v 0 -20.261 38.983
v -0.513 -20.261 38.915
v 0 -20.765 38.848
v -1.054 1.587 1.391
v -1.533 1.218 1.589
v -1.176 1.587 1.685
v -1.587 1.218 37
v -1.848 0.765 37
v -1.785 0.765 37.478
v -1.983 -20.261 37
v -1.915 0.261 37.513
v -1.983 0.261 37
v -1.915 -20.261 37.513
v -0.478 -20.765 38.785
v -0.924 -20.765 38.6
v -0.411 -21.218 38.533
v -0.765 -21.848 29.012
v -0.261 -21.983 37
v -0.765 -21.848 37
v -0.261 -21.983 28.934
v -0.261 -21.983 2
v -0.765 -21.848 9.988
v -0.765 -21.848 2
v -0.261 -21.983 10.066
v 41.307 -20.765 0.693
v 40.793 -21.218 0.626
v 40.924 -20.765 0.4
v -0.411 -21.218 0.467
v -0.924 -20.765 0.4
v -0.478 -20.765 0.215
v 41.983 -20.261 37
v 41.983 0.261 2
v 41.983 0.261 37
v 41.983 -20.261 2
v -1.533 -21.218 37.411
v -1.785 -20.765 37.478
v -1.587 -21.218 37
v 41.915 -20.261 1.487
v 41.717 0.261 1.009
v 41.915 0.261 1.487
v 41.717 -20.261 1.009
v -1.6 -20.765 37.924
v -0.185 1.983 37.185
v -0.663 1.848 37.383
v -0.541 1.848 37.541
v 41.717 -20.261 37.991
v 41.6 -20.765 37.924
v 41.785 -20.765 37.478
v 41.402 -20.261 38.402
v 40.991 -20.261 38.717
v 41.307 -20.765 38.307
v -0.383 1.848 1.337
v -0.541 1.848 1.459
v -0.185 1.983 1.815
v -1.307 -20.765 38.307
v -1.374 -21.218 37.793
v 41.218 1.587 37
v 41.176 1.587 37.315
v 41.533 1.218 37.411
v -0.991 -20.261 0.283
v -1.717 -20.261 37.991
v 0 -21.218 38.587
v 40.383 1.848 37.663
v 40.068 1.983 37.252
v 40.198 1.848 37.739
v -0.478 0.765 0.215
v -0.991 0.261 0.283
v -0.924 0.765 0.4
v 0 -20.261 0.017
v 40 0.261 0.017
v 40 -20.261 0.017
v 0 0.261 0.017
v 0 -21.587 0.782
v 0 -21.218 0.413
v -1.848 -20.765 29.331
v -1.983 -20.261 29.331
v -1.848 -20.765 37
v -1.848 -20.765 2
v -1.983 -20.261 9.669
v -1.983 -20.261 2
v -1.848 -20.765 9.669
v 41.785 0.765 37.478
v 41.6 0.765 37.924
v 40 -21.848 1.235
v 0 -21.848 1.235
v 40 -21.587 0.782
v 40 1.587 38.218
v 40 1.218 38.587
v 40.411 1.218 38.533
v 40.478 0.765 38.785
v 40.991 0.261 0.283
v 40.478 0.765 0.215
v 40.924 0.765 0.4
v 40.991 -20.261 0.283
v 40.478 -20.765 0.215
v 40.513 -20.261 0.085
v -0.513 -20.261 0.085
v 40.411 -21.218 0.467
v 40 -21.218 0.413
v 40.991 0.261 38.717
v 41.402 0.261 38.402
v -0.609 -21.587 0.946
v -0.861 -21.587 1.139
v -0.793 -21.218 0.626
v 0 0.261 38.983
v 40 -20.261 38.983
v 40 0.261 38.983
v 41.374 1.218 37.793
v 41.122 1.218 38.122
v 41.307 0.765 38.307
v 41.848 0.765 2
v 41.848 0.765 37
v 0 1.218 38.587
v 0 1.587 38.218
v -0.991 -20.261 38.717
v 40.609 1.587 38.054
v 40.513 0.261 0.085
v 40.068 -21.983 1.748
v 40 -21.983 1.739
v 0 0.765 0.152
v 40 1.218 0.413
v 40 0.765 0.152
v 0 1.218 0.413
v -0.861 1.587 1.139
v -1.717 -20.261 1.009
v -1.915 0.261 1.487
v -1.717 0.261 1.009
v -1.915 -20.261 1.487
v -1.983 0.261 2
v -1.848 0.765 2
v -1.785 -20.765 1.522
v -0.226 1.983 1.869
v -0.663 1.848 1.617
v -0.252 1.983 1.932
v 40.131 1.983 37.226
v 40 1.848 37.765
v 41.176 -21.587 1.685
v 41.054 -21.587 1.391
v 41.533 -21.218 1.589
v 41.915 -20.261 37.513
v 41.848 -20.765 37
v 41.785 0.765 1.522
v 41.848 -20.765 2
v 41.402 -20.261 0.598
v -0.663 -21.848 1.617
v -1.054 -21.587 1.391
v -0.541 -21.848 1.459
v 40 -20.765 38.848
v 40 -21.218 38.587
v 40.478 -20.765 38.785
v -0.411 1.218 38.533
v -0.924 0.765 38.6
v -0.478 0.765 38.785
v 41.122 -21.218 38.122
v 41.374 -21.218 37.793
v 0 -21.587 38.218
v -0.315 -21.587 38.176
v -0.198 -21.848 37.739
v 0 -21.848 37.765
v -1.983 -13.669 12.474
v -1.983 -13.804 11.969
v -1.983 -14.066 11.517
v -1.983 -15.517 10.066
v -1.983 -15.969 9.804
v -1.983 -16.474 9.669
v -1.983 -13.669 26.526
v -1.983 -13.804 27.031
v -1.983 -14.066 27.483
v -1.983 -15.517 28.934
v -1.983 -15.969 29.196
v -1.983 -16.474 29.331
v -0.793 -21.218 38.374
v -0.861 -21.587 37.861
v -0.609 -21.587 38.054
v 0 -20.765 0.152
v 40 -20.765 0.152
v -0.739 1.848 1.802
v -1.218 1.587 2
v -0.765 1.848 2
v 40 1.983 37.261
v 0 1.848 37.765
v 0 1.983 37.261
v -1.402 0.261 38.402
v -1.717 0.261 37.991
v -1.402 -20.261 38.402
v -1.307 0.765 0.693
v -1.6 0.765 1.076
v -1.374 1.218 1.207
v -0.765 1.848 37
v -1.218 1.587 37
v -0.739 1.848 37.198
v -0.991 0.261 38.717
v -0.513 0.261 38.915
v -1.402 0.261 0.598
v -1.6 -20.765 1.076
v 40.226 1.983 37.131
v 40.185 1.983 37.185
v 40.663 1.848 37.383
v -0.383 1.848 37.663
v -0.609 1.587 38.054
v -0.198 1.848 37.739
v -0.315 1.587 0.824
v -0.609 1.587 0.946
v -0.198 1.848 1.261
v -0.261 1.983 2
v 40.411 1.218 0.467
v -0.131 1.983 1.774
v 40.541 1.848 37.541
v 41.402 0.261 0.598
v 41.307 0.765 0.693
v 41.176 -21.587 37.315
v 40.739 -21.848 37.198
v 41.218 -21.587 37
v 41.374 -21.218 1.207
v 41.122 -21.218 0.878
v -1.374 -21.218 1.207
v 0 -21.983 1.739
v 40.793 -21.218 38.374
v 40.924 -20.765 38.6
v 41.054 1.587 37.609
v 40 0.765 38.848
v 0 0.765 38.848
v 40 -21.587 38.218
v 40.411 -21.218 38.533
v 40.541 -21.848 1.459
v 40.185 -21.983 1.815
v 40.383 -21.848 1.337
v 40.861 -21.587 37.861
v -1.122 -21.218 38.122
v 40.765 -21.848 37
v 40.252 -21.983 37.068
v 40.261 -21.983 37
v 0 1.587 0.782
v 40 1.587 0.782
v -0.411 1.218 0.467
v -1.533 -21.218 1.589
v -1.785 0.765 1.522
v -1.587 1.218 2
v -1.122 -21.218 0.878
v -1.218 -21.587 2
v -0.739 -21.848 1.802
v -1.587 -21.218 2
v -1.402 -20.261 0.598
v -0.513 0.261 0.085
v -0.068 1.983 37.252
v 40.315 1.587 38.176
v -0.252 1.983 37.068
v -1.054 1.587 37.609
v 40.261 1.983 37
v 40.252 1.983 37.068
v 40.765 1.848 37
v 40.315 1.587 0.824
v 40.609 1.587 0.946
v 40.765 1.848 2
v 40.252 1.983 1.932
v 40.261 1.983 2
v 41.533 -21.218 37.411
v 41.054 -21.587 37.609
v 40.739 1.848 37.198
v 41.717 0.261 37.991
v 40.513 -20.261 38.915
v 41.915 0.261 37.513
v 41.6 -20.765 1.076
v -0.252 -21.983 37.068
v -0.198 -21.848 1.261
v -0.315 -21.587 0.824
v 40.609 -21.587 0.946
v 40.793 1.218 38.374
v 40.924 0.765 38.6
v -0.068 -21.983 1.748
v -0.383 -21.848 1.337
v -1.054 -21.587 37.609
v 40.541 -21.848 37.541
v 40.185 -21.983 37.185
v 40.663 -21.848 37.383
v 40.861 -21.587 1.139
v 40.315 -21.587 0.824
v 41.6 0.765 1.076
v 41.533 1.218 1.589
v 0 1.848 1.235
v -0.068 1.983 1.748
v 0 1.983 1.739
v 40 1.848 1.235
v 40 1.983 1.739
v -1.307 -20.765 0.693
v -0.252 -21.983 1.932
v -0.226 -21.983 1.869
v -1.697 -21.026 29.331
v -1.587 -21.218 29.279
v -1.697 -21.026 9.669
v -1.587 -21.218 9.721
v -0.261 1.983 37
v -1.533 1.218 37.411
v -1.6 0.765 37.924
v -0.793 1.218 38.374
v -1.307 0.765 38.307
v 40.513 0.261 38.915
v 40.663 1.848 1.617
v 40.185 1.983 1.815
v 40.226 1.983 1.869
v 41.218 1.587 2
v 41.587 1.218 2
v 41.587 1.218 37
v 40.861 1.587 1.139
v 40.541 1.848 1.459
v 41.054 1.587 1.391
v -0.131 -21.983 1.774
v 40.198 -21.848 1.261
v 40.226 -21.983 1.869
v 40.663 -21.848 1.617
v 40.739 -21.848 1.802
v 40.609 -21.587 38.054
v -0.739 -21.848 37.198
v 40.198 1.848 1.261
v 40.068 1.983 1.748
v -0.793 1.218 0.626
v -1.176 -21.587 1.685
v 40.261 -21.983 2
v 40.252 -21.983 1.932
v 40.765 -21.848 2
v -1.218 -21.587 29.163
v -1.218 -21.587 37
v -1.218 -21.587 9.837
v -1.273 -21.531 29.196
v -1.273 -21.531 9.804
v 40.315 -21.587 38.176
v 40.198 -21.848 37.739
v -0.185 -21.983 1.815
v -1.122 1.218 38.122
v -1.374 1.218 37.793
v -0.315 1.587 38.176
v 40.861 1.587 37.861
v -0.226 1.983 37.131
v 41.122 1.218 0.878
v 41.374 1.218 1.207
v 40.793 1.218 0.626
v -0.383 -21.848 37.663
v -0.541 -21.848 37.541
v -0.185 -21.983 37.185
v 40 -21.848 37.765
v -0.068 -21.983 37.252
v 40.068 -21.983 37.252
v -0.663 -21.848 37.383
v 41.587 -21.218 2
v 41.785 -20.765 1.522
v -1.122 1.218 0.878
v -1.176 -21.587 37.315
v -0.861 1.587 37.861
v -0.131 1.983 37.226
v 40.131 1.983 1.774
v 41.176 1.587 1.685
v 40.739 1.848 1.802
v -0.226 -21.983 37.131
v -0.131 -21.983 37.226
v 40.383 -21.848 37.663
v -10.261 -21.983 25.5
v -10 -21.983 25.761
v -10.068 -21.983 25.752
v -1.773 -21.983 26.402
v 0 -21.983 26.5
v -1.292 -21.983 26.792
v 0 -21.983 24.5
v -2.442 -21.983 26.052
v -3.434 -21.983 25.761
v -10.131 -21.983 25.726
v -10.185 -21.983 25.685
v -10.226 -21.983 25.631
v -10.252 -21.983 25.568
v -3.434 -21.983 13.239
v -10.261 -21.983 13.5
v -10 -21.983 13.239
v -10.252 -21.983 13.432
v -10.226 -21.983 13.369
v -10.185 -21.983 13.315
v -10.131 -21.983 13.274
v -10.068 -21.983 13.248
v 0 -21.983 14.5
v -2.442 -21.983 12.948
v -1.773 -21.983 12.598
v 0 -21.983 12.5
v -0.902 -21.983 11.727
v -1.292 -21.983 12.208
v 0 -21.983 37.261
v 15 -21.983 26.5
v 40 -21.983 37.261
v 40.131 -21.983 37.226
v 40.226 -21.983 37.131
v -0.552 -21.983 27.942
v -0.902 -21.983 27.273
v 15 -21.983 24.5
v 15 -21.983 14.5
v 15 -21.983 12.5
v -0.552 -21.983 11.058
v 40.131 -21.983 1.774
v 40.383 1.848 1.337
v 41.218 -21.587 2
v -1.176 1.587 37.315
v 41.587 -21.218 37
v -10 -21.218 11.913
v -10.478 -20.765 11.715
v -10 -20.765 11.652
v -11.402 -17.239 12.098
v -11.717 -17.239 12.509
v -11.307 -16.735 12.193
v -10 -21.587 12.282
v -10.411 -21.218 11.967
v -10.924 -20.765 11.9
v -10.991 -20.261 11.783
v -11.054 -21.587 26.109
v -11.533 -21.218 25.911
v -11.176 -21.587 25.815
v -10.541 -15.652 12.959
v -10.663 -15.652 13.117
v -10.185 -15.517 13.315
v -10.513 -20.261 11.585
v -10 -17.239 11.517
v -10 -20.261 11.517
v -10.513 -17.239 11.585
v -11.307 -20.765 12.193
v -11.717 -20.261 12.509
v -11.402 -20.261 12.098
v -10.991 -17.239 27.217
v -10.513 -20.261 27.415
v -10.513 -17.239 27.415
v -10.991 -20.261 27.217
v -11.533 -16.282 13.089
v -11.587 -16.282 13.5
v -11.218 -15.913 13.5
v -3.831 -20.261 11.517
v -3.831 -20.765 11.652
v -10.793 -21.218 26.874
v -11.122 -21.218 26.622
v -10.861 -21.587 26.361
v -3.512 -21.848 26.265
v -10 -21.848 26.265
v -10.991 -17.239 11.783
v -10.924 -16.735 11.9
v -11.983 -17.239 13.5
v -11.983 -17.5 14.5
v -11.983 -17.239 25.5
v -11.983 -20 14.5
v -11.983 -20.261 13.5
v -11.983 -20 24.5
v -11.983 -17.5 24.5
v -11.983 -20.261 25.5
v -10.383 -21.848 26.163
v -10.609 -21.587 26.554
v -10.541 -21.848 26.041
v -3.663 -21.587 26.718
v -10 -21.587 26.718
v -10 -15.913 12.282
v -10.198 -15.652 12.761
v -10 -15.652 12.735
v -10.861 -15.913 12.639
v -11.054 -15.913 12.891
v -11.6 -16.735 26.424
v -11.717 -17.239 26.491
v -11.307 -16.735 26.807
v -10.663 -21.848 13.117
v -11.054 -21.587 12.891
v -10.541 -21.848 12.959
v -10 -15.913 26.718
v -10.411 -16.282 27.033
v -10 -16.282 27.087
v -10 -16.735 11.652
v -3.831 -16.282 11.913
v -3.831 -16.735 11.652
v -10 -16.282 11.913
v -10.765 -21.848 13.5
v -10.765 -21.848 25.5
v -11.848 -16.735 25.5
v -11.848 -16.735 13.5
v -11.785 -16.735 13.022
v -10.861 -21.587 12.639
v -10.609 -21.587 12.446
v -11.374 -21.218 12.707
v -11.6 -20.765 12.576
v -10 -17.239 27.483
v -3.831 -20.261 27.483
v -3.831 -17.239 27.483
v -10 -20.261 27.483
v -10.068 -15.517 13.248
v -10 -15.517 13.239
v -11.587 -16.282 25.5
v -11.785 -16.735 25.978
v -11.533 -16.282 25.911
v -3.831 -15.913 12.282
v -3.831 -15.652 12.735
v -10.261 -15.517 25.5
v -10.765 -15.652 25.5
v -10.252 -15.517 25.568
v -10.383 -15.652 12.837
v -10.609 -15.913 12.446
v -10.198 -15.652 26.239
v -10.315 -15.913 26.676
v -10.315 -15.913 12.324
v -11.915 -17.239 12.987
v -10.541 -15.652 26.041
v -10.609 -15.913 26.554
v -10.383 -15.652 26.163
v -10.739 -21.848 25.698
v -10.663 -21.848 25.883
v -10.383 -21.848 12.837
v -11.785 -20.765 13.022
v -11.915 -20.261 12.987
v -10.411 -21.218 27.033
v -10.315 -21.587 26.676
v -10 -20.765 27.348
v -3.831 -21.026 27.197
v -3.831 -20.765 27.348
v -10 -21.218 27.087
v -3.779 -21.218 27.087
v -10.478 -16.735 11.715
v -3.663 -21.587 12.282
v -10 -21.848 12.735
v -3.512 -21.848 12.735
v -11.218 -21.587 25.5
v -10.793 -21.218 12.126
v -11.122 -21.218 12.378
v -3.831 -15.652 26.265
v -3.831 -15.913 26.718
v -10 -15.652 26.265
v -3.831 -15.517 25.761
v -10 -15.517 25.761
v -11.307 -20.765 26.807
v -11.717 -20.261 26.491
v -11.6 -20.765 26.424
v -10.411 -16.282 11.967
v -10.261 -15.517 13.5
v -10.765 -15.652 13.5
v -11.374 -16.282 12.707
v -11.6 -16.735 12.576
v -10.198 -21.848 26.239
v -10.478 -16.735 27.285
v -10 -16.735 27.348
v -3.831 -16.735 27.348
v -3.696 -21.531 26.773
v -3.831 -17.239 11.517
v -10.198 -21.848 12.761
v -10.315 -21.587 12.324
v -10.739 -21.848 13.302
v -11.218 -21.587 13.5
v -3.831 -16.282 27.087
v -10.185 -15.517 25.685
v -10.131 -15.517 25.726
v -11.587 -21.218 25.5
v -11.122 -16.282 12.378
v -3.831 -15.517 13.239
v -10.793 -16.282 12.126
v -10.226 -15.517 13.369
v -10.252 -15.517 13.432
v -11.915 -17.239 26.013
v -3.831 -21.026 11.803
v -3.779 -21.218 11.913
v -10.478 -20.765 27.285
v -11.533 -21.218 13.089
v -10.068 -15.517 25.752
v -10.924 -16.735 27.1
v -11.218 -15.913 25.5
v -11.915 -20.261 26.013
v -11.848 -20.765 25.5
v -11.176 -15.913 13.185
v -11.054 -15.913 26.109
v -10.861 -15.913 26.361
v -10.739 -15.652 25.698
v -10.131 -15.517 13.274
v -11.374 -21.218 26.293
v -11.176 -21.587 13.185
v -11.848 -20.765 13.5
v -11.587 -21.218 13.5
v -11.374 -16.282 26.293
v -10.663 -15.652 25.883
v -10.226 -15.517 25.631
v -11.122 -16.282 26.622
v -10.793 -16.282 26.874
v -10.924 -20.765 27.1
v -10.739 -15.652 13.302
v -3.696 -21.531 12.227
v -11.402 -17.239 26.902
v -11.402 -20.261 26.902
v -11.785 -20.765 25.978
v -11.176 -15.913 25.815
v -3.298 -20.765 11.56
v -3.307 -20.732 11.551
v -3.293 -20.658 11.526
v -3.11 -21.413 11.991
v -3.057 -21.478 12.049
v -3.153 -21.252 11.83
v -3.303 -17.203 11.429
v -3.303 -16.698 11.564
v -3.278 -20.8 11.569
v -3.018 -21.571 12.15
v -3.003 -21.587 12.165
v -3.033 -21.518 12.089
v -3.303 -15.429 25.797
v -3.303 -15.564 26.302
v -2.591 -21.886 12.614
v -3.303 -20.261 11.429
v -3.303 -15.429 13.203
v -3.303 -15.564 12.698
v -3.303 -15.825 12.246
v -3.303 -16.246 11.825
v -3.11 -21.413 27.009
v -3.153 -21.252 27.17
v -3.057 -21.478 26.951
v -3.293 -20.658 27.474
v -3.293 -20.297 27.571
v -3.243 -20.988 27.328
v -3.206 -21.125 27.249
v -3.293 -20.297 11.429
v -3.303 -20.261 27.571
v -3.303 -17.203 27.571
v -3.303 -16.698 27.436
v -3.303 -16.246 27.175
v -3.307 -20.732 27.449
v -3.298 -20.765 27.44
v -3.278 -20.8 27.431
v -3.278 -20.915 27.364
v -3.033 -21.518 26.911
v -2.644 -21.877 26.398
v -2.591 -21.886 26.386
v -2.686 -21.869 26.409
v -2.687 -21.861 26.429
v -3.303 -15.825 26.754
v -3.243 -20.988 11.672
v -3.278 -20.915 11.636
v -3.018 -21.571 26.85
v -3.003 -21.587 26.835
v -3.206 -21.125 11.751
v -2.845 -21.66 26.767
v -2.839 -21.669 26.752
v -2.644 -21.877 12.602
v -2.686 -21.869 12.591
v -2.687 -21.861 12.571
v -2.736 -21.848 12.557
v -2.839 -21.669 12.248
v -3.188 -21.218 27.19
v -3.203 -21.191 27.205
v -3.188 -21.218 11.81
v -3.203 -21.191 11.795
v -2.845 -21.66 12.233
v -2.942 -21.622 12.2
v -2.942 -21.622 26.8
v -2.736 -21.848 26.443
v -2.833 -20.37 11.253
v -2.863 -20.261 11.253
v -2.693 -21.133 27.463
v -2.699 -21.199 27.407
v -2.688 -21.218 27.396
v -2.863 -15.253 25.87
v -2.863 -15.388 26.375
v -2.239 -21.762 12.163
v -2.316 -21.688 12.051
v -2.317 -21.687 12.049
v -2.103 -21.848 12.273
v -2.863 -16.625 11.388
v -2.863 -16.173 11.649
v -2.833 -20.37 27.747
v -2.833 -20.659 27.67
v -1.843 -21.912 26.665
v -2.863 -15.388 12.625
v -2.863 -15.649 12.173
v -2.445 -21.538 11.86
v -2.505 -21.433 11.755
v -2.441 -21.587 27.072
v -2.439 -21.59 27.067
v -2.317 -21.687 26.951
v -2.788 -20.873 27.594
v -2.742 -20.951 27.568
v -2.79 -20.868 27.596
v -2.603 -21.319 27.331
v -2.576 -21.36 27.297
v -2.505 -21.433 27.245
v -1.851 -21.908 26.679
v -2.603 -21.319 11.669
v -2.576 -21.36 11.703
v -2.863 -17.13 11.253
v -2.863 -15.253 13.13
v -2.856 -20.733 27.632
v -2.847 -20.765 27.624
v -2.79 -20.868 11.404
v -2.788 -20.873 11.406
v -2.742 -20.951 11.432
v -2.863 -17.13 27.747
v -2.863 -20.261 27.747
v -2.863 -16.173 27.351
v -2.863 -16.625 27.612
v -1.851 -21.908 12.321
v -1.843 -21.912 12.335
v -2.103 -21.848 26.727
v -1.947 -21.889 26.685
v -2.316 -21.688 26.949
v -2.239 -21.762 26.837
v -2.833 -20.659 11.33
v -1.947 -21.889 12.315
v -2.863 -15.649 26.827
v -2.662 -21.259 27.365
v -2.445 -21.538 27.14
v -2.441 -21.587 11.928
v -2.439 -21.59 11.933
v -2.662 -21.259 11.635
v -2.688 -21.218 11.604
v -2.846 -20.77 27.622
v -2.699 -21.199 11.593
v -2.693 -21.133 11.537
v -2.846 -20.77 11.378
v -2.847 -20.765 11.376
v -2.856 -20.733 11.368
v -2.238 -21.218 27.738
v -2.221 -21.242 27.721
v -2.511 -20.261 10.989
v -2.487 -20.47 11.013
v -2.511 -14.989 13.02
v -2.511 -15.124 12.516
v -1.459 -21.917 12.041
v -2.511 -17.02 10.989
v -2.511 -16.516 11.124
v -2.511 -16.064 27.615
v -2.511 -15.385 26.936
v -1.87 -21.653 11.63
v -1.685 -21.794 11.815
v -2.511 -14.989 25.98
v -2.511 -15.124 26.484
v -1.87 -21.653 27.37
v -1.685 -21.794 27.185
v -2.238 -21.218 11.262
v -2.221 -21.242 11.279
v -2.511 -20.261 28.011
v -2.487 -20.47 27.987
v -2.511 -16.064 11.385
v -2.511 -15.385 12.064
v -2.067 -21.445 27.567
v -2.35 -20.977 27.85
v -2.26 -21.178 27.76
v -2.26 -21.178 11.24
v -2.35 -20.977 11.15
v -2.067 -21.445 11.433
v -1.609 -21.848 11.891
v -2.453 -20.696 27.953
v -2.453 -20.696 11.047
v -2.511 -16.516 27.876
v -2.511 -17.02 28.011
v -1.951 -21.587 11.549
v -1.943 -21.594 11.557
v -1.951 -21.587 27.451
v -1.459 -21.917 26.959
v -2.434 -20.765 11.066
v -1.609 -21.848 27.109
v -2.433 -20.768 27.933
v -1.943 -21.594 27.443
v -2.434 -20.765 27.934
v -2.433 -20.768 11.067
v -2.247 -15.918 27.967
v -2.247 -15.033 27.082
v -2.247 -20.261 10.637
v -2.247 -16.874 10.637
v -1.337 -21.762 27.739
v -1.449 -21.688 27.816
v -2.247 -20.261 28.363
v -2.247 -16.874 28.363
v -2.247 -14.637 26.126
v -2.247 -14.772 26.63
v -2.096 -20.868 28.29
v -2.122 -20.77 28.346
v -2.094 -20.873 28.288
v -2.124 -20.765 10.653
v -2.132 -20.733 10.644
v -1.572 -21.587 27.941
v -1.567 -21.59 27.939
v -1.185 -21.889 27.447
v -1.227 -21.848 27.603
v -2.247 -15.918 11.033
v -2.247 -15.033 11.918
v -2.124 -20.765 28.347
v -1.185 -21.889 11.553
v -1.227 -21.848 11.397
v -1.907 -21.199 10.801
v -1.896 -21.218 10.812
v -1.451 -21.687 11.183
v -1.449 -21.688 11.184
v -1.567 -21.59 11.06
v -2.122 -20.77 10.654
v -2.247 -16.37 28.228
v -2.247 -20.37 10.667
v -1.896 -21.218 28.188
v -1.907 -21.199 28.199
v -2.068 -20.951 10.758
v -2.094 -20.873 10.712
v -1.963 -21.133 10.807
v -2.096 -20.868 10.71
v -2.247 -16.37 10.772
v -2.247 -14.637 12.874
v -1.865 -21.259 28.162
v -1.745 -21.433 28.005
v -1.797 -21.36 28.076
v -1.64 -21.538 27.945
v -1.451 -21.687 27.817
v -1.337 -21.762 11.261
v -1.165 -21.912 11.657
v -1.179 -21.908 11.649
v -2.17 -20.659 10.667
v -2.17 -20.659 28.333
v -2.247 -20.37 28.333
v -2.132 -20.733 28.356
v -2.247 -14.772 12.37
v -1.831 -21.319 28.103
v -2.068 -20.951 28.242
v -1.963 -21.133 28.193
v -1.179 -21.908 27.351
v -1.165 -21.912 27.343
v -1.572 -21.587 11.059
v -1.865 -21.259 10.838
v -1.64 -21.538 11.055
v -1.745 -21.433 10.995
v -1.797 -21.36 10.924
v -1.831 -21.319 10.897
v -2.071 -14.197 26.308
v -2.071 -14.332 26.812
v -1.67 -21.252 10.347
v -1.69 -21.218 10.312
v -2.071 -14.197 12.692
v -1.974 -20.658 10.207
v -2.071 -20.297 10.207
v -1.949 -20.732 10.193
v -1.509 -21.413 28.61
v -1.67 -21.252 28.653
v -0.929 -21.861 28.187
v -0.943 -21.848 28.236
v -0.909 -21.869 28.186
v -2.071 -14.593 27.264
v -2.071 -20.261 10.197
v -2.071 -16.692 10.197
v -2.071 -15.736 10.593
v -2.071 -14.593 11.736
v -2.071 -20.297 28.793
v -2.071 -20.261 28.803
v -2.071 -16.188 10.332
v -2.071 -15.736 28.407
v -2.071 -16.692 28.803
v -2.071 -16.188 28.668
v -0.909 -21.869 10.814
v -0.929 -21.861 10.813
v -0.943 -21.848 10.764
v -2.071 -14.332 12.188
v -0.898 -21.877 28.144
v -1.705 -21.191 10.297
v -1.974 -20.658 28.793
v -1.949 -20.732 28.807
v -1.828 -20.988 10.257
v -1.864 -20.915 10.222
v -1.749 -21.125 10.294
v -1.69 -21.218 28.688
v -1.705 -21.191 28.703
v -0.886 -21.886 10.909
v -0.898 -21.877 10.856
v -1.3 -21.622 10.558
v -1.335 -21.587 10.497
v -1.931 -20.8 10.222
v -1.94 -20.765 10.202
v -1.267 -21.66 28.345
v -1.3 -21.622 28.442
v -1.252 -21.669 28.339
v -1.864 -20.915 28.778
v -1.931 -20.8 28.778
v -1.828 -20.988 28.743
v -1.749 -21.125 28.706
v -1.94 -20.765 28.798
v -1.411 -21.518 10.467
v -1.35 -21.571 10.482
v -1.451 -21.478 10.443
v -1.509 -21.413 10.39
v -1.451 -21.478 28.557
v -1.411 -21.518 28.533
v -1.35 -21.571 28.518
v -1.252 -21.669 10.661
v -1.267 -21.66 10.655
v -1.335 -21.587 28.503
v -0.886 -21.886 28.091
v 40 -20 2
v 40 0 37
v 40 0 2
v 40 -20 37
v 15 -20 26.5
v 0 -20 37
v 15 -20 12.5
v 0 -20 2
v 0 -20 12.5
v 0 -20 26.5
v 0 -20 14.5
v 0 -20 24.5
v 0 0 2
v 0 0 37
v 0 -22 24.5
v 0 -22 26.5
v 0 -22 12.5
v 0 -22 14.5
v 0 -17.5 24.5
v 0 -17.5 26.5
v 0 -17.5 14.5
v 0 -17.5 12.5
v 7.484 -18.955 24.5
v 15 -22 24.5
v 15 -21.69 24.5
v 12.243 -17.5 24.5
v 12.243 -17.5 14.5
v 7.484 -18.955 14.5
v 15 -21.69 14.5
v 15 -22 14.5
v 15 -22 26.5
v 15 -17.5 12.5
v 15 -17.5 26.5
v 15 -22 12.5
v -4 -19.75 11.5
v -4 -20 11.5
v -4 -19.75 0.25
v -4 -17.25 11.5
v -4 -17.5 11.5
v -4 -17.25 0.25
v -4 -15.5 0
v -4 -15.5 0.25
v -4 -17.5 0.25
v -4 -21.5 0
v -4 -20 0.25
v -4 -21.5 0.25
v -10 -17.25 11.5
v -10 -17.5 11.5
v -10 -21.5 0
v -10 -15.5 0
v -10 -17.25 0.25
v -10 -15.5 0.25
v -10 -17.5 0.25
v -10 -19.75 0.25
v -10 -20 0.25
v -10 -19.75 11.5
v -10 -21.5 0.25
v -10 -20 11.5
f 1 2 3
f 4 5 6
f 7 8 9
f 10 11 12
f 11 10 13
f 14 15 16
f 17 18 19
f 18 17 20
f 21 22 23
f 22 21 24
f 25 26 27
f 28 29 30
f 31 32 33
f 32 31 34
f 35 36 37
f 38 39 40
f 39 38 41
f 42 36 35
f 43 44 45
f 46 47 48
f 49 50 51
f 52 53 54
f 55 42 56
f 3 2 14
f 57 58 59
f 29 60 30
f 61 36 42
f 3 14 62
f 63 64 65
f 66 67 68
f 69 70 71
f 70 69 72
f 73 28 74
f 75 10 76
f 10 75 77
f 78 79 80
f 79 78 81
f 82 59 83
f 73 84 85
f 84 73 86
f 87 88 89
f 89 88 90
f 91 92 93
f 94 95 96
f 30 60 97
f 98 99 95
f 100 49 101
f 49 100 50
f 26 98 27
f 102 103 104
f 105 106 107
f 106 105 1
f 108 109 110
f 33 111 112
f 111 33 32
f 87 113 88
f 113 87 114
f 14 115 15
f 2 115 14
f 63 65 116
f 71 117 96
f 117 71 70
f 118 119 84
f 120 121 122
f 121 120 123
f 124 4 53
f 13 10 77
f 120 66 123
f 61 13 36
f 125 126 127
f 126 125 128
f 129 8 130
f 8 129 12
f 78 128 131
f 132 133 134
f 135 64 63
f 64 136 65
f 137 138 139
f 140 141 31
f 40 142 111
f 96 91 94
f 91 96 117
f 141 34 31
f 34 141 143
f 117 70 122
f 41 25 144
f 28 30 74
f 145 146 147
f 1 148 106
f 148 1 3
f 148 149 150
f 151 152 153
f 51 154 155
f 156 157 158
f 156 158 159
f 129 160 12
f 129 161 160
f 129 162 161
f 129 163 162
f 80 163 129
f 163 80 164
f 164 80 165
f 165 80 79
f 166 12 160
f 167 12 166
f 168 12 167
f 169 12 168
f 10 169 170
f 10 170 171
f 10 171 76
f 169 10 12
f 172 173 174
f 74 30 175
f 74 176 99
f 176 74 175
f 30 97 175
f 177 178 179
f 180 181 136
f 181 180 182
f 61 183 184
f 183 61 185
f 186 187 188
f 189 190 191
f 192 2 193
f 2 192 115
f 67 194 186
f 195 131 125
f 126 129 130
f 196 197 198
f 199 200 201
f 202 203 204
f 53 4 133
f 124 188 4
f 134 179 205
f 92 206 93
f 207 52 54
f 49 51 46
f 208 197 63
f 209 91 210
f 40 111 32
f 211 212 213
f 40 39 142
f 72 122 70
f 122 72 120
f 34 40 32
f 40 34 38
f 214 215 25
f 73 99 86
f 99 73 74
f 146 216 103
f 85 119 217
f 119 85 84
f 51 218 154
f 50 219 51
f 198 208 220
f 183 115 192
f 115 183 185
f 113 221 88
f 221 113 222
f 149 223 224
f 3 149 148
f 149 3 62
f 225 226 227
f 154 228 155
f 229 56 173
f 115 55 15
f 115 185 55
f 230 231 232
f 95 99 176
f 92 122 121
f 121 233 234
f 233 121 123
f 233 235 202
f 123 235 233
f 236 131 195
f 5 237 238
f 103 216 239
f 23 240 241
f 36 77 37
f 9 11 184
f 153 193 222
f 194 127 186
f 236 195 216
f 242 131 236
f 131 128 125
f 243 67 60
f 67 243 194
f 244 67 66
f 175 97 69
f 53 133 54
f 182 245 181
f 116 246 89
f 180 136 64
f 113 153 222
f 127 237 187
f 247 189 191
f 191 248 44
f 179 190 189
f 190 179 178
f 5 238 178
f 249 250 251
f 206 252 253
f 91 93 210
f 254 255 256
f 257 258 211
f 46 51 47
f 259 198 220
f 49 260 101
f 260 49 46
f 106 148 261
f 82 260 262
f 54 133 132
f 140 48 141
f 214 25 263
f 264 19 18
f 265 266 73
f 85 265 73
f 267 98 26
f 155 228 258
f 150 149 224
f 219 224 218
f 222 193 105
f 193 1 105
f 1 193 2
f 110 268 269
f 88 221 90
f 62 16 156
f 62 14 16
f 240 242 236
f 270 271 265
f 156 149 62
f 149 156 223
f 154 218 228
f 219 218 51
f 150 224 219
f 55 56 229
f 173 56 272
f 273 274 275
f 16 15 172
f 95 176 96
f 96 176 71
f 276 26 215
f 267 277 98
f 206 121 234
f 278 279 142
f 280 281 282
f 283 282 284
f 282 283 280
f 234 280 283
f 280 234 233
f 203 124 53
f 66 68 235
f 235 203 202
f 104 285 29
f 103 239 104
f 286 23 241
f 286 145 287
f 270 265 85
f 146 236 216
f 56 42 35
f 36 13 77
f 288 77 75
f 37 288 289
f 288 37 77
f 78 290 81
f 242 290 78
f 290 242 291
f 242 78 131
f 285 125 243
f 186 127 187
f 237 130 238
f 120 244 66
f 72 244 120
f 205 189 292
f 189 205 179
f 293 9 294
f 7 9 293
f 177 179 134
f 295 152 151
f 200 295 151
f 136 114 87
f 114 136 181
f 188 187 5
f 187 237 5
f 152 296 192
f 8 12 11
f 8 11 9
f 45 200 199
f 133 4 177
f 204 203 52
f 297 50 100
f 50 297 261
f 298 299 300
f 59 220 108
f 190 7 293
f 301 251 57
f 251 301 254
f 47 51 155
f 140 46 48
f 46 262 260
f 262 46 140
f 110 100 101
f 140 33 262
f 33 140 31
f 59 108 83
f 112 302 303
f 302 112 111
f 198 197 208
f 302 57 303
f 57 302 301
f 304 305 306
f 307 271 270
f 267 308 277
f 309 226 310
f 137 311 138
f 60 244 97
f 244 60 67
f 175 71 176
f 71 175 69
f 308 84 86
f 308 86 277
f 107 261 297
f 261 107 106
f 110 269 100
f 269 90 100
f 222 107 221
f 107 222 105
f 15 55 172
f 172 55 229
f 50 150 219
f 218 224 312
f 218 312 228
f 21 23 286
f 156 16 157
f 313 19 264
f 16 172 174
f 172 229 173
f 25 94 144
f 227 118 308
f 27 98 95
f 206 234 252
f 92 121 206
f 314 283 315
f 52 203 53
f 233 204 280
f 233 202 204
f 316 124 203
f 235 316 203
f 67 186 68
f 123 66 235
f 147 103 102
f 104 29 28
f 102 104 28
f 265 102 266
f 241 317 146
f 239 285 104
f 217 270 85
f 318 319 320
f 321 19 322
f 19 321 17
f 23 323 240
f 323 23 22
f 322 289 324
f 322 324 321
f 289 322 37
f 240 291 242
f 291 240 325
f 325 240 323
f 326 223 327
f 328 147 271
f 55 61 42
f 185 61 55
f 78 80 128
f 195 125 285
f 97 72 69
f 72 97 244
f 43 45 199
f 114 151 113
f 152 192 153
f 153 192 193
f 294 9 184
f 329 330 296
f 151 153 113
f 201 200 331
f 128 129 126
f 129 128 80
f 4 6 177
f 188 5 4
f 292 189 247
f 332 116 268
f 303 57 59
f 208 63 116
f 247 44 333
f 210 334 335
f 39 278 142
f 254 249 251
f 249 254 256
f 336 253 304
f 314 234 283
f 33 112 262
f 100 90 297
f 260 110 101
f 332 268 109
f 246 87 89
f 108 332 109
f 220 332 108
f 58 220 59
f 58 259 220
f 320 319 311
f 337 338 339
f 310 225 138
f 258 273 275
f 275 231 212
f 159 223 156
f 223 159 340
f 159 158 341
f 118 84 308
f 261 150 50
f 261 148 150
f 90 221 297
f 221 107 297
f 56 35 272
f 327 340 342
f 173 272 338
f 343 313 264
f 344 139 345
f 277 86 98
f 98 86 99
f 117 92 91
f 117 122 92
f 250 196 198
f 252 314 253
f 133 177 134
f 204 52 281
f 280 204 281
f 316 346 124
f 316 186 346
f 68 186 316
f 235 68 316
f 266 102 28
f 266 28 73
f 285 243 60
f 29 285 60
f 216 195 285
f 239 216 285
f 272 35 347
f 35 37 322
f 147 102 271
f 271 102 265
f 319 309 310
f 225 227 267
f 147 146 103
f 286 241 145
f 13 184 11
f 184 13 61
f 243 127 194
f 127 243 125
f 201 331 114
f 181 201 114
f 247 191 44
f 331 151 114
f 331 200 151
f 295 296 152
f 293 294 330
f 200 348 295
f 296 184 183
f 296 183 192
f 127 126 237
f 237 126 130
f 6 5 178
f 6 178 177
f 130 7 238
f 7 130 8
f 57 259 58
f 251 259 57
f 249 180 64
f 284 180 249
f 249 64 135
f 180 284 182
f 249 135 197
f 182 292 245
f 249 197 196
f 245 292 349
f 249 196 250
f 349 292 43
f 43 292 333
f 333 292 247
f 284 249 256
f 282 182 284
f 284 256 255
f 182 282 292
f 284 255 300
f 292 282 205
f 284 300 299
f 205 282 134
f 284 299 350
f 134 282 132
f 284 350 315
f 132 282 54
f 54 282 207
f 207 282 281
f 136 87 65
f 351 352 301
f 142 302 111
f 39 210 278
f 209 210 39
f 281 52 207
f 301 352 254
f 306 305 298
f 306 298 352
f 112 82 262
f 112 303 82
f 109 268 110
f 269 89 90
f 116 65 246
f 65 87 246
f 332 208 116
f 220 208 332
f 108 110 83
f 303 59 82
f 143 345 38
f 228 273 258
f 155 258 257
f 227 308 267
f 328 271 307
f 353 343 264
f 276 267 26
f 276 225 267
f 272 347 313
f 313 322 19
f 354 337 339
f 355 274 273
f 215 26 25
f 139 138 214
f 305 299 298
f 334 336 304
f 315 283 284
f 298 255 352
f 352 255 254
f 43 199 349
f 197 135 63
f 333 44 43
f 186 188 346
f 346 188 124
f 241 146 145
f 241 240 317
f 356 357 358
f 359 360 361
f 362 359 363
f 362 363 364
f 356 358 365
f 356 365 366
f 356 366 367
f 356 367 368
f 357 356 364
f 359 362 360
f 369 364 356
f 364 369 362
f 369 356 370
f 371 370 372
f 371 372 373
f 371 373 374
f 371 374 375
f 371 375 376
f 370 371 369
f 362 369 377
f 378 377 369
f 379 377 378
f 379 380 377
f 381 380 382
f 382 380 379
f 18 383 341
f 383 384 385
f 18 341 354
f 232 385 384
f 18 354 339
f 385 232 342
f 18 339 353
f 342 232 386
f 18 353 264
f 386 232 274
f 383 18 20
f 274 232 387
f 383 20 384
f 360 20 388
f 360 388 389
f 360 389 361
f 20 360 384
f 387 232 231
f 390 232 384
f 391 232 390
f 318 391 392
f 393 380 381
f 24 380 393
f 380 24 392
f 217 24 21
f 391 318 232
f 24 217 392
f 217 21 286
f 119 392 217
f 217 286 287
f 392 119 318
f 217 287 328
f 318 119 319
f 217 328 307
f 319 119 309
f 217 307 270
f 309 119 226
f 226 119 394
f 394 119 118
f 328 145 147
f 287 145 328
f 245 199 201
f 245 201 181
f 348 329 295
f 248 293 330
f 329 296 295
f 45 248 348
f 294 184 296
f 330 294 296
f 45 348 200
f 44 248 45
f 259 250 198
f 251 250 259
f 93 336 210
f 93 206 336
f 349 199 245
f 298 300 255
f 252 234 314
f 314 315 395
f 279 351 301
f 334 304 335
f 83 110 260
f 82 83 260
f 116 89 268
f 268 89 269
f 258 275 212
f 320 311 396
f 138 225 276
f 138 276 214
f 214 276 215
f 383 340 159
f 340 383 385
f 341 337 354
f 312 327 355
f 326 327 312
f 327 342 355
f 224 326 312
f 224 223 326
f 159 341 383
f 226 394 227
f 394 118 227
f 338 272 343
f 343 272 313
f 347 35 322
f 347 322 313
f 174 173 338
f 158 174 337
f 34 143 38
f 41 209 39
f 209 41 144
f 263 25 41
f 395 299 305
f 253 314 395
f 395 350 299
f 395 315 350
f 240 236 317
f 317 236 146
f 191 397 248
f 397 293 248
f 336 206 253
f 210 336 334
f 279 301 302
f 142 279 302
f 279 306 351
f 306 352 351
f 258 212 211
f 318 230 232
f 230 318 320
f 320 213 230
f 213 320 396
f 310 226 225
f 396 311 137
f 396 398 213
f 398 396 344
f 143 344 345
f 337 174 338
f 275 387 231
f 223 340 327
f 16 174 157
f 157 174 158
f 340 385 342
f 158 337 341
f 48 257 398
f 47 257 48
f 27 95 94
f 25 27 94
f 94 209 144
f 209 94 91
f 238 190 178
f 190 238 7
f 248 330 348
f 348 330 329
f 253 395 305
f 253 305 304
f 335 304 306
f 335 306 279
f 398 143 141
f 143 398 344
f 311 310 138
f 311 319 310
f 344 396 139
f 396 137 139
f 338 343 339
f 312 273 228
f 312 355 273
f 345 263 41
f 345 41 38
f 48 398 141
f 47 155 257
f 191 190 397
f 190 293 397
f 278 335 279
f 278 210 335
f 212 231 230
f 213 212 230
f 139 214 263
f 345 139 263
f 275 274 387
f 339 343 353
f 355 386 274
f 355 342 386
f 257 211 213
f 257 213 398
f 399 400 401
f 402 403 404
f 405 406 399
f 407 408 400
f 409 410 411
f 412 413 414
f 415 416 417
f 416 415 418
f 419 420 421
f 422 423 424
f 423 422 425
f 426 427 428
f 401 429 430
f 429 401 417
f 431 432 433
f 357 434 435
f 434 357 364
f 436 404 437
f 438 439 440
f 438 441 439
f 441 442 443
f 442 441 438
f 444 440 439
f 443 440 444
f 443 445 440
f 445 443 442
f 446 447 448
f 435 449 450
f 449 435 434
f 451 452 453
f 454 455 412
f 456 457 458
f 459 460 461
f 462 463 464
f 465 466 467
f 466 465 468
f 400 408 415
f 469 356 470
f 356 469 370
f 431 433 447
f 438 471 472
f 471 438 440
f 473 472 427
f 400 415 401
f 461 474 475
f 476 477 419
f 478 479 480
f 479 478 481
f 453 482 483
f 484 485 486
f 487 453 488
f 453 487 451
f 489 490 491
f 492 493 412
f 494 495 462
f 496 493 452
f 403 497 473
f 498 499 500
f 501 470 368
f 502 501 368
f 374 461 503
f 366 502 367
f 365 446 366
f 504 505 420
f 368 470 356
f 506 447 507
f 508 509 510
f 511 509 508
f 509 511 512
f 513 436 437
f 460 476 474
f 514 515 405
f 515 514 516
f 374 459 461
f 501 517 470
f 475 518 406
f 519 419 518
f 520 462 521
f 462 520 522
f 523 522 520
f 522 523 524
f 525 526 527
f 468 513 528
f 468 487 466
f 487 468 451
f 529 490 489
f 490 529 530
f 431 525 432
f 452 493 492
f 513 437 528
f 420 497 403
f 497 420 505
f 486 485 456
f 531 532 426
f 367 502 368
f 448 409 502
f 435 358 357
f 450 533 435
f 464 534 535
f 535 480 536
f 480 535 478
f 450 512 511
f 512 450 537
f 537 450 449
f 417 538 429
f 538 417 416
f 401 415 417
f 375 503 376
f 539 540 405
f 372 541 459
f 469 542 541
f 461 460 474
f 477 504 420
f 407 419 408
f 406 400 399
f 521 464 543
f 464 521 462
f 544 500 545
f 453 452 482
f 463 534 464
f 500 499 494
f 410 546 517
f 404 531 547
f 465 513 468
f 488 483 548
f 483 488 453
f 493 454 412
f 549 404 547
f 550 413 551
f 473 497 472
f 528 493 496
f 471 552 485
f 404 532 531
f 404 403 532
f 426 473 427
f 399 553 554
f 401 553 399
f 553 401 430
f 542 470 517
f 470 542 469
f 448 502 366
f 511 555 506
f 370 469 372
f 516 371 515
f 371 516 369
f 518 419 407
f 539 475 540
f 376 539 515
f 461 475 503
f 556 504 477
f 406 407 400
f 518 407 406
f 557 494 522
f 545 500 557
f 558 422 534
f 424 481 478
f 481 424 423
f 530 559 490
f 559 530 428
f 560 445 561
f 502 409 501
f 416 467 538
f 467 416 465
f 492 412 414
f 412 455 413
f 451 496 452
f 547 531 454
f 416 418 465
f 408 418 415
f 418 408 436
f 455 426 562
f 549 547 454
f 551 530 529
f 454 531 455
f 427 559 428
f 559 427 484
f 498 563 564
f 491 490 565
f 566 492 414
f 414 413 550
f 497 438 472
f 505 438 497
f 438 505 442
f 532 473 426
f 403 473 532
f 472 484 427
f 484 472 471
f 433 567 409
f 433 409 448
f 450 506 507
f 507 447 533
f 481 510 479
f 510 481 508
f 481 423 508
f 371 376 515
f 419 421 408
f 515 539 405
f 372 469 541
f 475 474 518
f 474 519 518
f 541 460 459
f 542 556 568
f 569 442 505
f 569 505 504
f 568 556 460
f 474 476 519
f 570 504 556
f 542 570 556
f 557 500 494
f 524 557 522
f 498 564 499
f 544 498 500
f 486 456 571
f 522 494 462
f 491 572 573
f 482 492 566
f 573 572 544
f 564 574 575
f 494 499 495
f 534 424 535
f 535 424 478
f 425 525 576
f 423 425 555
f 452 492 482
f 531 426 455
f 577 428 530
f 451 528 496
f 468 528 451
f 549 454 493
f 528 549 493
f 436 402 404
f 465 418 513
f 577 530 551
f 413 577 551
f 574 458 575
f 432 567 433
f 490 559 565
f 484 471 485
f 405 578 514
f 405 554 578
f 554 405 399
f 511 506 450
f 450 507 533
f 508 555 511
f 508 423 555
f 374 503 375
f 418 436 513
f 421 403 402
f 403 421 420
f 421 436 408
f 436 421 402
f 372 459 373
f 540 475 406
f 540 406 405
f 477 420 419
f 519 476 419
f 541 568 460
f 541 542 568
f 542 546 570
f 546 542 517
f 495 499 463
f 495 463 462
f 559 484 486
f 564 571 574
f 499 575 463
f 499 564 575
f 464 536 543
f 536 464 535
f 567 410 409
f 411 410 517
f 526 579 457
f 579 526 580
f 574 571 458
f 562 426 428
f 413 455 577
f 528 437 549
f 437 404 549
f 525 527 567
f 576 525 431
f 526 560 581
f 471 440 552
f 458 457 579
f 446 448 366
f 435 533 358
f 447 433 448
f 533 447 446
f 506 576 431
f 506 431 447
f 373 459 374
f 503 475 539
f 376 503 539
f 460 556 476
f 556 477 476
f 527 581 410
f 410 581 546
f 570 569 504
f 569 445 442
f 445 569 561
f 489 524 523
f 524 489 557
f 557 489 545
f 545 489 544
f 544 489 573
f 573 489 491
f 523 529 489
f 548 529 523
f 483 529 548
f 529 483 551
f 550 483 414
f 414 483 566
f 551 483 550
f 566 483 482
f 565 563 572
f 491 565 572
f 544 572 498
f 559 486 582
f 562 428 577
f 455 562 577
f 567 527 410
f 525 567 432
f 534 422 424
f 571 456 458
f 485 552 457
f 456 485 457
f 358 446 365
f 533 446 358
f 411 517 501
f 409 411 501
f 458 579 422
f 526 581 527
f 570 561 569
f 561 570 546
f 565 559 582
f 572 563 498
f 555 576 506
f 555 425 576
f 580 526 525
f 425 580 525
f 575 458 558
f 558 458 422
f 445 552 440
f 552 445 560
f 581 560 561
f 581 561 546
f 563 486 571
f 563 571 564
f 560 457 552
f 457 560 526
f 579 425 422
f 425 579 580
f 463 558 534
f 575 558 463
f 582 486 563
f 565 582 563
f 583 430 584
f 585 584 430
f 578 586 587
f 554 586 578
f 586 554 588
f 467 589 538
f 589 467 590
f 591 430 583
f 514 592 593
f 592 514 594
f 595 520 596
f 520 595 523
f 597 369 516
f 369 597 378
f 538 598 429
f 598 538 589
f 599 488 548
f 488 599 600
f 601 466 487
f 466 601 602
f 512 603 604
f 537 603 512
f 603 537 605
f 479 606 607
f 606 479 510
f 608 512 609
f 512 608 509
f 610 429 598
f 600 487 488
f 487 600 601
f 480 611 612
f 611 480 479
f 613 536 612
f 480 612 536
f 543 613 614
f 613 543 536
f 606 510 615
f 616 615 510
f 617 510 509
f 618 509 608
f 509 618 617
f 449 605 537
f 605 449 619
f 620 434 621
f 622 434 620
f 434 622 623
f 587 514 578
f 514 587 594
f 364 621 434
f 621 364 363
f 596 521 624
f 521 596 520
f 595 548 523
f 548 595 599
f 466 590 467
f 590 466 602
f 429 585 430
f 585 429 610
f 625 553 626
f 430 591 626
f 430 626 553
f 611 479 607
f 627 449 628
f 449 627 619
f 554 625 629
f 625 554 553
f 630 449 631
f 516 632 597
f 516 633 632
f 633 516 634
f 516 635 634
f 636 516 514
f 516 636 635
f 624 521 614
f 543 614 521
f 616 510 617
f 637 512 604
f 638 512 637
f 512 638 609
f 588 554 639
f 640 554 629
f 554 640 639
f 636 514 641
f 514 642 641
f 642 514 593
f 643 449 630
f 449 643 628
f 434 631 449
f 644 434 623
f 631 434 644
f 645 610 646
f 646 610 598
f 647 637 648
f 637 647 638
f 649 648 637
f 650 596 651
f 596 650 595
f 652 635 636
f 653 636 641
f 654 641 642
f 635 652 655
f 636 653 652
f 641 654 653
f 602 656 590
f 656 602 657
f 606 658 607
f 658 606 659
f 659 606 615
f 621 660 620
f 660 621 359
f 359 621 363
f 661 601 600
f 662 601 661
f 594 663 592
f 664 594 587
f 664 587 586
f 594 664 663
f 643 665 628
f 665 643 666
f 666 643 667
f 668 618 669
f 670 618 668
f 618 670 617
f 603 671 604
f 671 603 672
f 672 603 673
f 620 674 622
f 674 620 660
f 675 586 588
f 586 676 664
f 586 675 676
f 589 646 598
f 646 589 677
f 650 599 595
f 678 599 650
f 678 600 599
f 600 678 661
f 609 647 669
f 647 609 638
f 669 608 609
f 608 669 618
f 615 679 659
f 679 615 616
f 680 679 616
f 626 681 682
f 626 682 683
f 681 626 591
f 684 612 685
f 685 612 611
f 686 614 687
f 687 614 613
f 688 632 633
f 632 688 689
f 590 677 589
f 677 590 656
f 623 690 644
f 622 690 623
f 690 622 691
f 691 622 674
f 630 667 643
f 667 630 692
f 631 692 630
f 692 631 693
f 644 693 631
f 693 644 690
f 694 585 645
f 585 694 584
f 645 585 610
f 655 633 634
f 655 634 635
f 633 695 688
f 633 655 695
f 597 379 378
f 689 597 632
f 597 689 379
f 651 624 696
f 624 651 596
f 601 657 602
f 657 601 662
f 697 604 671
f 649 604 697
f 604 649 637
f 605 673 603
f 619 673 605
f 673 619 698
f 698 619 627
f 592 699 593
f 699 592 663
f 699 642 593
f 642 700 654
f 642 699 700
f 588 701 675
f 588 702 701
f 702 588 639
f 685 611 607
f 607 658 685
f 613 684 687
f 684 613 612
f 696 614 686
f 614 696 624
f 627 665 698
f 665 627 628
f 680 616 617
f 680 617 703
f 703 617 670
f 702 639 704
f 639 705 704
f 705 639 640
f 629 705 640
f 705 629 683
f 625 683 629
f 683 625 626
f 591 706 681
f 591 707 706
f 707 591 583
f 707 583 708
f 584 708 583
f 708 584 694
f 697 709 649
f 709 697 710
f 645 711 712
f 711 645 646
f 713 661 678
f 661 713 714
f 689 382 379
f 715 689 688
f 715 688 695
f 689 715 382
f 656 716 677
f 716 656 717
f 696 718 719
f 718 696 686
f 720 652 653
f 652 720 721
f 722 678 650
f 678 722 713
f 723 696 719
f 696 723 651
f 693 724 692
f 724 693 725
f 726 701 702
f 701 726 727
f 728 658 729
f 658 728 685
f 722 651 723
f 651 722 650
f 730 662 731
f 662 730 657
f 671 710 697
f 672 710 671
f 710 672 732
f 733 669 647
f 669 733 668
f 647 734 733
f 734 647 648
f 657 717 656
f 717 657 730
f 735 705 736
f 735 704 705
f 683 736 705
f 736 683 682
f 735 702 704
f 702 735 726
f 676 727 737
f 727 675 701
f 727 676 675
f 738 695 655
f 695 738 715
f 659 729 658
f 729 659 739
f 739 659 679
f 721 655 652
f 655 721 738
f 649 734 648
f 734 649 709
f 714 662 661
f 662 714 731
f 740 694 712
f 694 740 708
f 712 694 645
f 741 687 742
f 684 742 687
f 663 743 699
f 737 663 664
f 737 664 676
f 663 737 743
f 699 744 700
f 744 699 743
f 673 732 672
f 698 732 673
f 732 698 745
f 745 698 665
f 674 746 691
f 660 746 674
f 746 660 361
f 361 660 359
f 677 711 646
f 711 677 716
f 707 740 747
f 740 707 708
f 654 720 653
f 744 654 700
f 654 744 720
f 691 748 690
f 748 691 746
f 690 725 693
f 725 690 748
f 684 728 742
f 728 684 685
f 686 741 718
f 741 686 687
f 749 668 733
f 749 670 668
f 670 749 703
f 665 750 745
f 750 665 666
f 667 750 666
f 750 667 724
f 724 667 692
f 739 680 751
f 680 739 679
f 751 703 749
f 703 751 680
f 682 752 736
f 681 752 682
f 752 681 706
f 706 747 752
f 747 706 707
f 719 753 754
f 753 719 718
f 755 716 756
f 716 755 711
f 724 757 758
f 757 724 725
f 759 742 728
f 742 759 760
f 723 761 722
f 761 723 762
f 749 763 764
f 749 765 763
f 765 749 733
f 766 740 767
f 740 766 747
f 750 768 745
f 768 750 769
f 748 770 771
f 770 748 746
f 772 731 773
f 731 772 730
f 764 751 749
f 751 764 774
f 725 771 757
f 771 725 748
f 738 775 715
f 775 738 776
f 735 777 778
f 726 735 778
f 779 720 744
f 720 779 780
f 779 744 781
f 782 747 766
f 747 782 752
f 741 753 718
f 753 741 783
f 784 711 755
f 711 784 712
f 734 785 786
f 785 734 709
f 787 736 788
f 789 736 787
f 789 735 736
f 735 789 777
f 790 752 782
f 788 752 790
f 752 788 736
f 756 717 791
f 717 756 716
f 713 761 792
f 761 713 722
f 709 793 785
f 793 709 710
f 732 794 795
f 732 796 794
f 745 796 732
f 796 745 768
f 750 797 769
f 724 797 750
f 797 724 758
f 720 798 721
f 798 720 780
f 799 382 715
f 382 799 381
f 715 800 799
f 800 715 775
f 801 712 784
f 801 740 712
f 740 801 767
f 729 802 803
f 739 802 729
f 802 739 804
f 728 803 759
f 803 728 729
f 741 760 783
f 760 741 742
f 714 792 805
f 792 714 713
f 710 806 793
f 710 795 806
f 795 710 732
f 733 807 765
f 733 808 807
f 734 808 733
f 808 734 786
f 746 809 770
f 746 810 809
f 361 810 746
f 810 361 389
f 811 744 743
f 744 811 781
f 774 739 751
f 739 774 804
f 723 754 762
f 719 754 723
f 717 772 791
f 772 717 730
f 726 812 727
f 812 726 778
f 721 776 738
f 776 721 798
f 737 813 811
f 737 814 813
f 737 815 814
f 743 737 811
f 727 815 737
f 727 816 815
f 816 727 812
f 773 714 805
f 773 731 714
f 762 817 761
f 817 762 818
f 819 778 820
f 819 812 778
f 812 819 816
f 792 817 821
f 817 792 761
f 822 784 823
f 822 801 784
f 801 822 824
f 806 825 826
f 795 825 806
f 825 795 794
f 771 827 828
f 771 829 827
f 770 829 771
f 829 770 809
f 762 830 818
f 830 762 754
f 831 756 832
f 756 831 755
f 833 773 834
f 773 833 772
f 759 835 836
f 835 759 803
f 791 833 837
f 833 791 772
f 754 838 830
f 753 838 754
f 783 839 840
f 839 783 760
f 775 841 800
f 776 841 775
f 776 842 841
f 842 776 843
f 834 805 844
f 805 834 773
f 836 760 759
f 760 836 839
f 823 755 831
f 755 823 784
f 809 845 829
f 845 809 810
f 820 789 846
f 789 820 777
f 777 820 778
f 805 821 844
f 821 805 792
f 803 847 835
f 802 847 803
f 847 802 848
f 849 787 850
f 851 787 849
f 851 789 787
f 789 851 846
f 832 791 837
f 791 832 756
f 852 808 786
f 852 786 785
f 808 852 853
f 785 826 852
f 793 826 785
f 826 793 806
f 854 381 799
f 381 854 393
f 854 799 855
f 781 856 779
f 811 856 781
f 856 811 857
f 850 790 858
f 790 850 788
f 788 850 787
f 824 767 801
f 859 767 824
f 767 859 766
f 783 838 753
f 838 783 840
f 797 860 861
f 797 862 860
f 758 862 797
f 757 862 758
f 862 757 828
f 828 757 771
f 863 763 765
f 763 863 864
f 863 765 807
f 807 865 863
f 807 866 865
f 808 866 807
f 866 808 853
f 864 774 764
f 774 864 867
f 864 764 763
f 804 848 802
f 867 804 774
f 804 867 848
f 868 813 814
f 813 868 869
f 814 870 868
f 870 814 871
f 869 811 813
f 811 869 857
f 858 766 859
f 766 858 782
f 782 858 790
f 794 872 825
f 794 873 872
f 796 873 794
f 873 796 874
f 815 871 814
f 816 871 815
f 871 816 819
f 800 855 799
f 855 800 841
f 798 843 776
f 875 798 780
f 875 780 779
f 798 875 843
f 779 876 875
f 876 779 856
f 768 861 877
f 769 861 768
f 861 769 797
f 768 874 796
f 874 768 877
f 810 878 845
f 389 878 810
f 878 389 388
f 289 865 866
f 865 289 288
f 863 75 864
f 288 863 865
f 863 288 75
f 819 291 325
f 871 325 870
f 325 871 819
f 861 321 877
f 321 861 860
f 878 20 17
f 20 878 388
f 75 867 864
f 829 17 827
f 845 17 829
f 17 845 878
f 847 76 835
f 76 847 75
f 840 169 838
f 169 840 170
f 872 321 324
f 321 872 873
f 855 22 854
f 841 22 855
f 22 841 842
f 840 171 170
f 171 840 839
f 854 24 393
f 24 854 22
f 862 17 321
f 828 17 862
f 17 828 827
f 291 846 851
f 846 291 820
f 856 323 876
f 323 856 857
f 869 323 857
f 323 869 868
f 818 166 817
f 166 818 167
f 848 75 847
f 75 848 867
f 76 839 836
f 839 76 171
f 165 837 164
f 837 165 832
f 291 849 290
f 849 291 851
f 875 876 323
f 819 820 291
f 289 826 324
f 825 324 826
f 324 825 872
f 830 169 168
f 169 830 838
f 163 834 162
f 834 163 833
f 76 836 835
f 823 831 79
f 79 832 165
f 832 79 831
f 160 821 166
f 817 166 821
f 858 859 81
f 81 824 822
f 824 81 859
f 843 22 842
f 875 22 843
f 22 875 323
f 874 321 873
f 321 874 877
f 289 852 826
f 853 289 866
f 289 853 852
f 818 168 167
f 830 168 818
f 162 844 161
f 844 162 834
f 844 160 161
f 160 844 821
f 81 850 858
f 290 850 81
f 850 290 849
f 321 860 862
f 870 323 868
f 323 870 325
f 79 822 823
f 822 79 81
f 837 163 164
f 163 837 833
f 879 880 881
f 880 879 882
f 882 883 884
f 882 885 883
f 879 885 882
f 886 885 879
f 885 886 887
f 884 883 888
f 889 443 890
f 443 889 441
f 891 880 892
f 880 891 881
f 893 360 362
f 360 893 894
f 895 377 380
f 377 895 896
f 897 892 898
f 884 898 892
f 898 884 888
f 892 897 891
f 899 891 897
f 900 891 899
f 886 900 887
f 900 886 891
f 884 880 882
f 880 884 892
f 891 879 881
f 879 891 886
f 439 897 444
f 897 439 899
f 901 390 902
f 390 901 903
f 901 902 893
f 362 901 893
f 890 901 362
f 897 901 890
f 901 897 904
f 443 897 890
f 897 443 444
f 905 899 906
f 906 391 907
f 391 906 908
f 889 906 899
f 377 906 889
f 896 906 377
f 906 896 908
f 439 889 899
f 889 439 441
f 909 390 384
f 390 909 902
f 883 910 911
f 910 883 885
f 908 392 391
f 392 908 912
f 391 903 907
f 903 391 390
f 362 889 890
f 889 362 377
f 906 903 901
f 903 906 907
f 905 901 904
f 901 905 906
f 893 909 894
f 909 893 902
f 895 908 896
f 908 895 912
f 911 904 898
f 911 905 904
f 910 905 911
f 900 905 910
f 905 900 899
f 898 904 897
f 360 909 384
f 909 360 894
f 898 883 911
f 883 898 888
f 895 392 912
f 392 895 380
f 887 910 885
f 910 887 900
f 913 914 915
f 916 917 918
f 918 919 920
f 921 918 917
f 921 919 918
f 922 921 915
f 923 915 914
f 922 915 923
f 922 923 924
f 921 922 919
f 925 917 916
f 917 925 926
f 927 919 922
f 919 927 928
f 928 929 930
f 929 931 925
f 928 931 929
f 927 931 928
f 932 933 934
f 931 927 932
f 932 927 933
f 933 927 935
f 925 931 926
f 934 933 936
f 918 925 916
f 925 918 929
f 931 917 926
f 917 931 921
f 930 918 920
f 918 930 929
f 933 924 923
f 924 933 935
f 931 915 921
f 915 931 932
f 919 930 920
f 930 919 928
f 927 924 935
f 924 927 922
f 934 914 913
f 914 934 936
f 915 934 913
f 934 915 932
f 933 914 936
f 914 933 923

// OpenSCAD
// file: fillets.scad
// Fillet function
/*
$fn = 24;
fillet(r=2,steps=5) {
	cylinder(r=5,h=10);
	cube([10,10,2]);
	rotate([30,30,30]) cylinder(r=1.0,h=50,center=true);
}
*/

module fillet(r=1.0,steps=3,include=true) {
  if(include) for (k=[0:$children-1]) {
	children(k);
  }
  for (i=[0:$children-2] ) {
    for(j=[i+1:$children-1] ) {
	fillet_two(r=r,steps=steps) {
	  children(i);
	  children(j);
	  intersection() {
		children(i);
		children(j);
	  }
	}
    }
  }
}

module fillet_two(r=1.0,steps=3) {
  for(step=[1:steps]) {
	hull() {
	  render() intersection() {
		children(0);
		offset_3d(r=r*step/steps) children(2);
	  }
	  render() intersection() {
		children(1);
		offset_3d(r=r*(steps-step+1)/steps) children(2);
	  }
	}
  }
}

module offset_3d(r=1.0) {
  for(k=[0:$children-1]) minkowski() {
	children(k);
	sphere(r=r,$fn=8);
  }
}
// main file
use <fillets.scad>

$fn = 24;  

length = 40;
width = 35;
height = 20;
rounding_radius = 2;

mouthpiece_size = [10, 12, 2.5];

ww_length = mouthpiece_size[0] + 9;
ww_width  = mouthpiece_size[1] - 2;
ww_height = mouthpiece_size[2];


fi_length = mouthpiece_size[0] + 5;
fi_width  = mouthpiece_size[1] - 2;
fi_height = mouthpiece_size[2];

// Uncomment basic or supported version
//whistle();
//whistle_with_supports();
whistle_with_supports2();


module whistle_with_supports2()
{
    z_offset = rounding_radius + height*sqrt(2)/2;
    translate([0, 0, rounding_radius])
        rotate([90,0,0])
            whistle();
    // add a t-shaped supports for mouthpiece
    support_position = height-mouthpiece_size[2];
    support_height = (width - mouthpiece_size[1])/2 ;
    translate([-10,-support_position,0])
        cube([6,.25,support_height]);
    translate([-10,-support_position-4,0])
        cube([6,6,.25]);

    support_position1 = height;
    translate([-10,-support_position1,0])
        cube([6,.25,support_height]);
}


module whistle_with_supports()
{
    z_offset = rounding_radius + height*sqrt(2)/2;
    translate([0, 0, z_offset])
        rotate([135,0,0])
            whistle();

    // add a t-shaped support for mouthpiece
    support_position = (height+(width-mouthpiece_size[1])/2) * sqrt(2)/2;
    support_height = (width - mouthpiece_size[1])/2 * sqrt(2)/2;
    translate([-10,-support_position,0])
        cube([6,.25,support_height]);
    translate([-10,-support_position-2,0])
        cube([6,4,.25]);

    // TODO: add some support for upper edge of fipple
}


// A hollow box with a windway and fipple
module whistle() {
    
    difference() {
        body();
        cube([length,width,height]); // main interior
        
        // Cutout Windway
        translate([
            -(mouthpiece_size[0]+rounding_radius+1), 
            (width - ww_width)/2, 
            height - ww_height
        ]) 
            cube([ww_length, ww_width, ww_height]);
        
        // Cutout for fipple block
        translate([0,(width - fi_width)/2,height - fi_height])
            cube([fi_length, fi_width, fi_height+rounding_radius]);
    }
    
    // form fipple as a seperate piece
    fipple();
    
}


module fipple_block() 
{
    w = fi_width + 4;
    translate([0,(width - w)/2, height - fi_height])
        cube([fi_length, w, fi_height + rounding_radius]);
}


module fipple()
{
    // Still some magic numbers here for tweeking fipple
    difference (){
        fipple_block();
        translate([2.8, (width - fi_width)/2, height - 2.75]) {
            rotate([0,-20,0])
                cube([15, fi_width, 5]); // fipple - top cut
            rotate([0,17,0])
                cube([15, fi_width, 3]); // fipple - inside cut
        }
        translate([0, (width - fi_width)/2, height - 2.75])
            cube([5, fi_width, 10]);
    }
}



// A rounded box with a mouthpiece
module body () 
{
    fillet(r=rounding_radius, steps=$fn/4) {
        // The main body
        rounded_box([length, width, height], rounding_radius);
        
        // The mouthpiece centered and flush with top
        translate([
                -(mouthpiece_size[0]), 
                width/2 - (mouthpiece_size[1])/2, 
                (height - mouthpiece_size[2])
            ]) 
            rounded_box(mouthpiece_size, rounding_radius);
    }
}


module rounded_box(size, radius)
{
    x = size[0];
    y = size[1];
    
    minkowski()
    {
        cube(size=[x,y,size[2]]);
        sphere(r=radius);
    }
}
